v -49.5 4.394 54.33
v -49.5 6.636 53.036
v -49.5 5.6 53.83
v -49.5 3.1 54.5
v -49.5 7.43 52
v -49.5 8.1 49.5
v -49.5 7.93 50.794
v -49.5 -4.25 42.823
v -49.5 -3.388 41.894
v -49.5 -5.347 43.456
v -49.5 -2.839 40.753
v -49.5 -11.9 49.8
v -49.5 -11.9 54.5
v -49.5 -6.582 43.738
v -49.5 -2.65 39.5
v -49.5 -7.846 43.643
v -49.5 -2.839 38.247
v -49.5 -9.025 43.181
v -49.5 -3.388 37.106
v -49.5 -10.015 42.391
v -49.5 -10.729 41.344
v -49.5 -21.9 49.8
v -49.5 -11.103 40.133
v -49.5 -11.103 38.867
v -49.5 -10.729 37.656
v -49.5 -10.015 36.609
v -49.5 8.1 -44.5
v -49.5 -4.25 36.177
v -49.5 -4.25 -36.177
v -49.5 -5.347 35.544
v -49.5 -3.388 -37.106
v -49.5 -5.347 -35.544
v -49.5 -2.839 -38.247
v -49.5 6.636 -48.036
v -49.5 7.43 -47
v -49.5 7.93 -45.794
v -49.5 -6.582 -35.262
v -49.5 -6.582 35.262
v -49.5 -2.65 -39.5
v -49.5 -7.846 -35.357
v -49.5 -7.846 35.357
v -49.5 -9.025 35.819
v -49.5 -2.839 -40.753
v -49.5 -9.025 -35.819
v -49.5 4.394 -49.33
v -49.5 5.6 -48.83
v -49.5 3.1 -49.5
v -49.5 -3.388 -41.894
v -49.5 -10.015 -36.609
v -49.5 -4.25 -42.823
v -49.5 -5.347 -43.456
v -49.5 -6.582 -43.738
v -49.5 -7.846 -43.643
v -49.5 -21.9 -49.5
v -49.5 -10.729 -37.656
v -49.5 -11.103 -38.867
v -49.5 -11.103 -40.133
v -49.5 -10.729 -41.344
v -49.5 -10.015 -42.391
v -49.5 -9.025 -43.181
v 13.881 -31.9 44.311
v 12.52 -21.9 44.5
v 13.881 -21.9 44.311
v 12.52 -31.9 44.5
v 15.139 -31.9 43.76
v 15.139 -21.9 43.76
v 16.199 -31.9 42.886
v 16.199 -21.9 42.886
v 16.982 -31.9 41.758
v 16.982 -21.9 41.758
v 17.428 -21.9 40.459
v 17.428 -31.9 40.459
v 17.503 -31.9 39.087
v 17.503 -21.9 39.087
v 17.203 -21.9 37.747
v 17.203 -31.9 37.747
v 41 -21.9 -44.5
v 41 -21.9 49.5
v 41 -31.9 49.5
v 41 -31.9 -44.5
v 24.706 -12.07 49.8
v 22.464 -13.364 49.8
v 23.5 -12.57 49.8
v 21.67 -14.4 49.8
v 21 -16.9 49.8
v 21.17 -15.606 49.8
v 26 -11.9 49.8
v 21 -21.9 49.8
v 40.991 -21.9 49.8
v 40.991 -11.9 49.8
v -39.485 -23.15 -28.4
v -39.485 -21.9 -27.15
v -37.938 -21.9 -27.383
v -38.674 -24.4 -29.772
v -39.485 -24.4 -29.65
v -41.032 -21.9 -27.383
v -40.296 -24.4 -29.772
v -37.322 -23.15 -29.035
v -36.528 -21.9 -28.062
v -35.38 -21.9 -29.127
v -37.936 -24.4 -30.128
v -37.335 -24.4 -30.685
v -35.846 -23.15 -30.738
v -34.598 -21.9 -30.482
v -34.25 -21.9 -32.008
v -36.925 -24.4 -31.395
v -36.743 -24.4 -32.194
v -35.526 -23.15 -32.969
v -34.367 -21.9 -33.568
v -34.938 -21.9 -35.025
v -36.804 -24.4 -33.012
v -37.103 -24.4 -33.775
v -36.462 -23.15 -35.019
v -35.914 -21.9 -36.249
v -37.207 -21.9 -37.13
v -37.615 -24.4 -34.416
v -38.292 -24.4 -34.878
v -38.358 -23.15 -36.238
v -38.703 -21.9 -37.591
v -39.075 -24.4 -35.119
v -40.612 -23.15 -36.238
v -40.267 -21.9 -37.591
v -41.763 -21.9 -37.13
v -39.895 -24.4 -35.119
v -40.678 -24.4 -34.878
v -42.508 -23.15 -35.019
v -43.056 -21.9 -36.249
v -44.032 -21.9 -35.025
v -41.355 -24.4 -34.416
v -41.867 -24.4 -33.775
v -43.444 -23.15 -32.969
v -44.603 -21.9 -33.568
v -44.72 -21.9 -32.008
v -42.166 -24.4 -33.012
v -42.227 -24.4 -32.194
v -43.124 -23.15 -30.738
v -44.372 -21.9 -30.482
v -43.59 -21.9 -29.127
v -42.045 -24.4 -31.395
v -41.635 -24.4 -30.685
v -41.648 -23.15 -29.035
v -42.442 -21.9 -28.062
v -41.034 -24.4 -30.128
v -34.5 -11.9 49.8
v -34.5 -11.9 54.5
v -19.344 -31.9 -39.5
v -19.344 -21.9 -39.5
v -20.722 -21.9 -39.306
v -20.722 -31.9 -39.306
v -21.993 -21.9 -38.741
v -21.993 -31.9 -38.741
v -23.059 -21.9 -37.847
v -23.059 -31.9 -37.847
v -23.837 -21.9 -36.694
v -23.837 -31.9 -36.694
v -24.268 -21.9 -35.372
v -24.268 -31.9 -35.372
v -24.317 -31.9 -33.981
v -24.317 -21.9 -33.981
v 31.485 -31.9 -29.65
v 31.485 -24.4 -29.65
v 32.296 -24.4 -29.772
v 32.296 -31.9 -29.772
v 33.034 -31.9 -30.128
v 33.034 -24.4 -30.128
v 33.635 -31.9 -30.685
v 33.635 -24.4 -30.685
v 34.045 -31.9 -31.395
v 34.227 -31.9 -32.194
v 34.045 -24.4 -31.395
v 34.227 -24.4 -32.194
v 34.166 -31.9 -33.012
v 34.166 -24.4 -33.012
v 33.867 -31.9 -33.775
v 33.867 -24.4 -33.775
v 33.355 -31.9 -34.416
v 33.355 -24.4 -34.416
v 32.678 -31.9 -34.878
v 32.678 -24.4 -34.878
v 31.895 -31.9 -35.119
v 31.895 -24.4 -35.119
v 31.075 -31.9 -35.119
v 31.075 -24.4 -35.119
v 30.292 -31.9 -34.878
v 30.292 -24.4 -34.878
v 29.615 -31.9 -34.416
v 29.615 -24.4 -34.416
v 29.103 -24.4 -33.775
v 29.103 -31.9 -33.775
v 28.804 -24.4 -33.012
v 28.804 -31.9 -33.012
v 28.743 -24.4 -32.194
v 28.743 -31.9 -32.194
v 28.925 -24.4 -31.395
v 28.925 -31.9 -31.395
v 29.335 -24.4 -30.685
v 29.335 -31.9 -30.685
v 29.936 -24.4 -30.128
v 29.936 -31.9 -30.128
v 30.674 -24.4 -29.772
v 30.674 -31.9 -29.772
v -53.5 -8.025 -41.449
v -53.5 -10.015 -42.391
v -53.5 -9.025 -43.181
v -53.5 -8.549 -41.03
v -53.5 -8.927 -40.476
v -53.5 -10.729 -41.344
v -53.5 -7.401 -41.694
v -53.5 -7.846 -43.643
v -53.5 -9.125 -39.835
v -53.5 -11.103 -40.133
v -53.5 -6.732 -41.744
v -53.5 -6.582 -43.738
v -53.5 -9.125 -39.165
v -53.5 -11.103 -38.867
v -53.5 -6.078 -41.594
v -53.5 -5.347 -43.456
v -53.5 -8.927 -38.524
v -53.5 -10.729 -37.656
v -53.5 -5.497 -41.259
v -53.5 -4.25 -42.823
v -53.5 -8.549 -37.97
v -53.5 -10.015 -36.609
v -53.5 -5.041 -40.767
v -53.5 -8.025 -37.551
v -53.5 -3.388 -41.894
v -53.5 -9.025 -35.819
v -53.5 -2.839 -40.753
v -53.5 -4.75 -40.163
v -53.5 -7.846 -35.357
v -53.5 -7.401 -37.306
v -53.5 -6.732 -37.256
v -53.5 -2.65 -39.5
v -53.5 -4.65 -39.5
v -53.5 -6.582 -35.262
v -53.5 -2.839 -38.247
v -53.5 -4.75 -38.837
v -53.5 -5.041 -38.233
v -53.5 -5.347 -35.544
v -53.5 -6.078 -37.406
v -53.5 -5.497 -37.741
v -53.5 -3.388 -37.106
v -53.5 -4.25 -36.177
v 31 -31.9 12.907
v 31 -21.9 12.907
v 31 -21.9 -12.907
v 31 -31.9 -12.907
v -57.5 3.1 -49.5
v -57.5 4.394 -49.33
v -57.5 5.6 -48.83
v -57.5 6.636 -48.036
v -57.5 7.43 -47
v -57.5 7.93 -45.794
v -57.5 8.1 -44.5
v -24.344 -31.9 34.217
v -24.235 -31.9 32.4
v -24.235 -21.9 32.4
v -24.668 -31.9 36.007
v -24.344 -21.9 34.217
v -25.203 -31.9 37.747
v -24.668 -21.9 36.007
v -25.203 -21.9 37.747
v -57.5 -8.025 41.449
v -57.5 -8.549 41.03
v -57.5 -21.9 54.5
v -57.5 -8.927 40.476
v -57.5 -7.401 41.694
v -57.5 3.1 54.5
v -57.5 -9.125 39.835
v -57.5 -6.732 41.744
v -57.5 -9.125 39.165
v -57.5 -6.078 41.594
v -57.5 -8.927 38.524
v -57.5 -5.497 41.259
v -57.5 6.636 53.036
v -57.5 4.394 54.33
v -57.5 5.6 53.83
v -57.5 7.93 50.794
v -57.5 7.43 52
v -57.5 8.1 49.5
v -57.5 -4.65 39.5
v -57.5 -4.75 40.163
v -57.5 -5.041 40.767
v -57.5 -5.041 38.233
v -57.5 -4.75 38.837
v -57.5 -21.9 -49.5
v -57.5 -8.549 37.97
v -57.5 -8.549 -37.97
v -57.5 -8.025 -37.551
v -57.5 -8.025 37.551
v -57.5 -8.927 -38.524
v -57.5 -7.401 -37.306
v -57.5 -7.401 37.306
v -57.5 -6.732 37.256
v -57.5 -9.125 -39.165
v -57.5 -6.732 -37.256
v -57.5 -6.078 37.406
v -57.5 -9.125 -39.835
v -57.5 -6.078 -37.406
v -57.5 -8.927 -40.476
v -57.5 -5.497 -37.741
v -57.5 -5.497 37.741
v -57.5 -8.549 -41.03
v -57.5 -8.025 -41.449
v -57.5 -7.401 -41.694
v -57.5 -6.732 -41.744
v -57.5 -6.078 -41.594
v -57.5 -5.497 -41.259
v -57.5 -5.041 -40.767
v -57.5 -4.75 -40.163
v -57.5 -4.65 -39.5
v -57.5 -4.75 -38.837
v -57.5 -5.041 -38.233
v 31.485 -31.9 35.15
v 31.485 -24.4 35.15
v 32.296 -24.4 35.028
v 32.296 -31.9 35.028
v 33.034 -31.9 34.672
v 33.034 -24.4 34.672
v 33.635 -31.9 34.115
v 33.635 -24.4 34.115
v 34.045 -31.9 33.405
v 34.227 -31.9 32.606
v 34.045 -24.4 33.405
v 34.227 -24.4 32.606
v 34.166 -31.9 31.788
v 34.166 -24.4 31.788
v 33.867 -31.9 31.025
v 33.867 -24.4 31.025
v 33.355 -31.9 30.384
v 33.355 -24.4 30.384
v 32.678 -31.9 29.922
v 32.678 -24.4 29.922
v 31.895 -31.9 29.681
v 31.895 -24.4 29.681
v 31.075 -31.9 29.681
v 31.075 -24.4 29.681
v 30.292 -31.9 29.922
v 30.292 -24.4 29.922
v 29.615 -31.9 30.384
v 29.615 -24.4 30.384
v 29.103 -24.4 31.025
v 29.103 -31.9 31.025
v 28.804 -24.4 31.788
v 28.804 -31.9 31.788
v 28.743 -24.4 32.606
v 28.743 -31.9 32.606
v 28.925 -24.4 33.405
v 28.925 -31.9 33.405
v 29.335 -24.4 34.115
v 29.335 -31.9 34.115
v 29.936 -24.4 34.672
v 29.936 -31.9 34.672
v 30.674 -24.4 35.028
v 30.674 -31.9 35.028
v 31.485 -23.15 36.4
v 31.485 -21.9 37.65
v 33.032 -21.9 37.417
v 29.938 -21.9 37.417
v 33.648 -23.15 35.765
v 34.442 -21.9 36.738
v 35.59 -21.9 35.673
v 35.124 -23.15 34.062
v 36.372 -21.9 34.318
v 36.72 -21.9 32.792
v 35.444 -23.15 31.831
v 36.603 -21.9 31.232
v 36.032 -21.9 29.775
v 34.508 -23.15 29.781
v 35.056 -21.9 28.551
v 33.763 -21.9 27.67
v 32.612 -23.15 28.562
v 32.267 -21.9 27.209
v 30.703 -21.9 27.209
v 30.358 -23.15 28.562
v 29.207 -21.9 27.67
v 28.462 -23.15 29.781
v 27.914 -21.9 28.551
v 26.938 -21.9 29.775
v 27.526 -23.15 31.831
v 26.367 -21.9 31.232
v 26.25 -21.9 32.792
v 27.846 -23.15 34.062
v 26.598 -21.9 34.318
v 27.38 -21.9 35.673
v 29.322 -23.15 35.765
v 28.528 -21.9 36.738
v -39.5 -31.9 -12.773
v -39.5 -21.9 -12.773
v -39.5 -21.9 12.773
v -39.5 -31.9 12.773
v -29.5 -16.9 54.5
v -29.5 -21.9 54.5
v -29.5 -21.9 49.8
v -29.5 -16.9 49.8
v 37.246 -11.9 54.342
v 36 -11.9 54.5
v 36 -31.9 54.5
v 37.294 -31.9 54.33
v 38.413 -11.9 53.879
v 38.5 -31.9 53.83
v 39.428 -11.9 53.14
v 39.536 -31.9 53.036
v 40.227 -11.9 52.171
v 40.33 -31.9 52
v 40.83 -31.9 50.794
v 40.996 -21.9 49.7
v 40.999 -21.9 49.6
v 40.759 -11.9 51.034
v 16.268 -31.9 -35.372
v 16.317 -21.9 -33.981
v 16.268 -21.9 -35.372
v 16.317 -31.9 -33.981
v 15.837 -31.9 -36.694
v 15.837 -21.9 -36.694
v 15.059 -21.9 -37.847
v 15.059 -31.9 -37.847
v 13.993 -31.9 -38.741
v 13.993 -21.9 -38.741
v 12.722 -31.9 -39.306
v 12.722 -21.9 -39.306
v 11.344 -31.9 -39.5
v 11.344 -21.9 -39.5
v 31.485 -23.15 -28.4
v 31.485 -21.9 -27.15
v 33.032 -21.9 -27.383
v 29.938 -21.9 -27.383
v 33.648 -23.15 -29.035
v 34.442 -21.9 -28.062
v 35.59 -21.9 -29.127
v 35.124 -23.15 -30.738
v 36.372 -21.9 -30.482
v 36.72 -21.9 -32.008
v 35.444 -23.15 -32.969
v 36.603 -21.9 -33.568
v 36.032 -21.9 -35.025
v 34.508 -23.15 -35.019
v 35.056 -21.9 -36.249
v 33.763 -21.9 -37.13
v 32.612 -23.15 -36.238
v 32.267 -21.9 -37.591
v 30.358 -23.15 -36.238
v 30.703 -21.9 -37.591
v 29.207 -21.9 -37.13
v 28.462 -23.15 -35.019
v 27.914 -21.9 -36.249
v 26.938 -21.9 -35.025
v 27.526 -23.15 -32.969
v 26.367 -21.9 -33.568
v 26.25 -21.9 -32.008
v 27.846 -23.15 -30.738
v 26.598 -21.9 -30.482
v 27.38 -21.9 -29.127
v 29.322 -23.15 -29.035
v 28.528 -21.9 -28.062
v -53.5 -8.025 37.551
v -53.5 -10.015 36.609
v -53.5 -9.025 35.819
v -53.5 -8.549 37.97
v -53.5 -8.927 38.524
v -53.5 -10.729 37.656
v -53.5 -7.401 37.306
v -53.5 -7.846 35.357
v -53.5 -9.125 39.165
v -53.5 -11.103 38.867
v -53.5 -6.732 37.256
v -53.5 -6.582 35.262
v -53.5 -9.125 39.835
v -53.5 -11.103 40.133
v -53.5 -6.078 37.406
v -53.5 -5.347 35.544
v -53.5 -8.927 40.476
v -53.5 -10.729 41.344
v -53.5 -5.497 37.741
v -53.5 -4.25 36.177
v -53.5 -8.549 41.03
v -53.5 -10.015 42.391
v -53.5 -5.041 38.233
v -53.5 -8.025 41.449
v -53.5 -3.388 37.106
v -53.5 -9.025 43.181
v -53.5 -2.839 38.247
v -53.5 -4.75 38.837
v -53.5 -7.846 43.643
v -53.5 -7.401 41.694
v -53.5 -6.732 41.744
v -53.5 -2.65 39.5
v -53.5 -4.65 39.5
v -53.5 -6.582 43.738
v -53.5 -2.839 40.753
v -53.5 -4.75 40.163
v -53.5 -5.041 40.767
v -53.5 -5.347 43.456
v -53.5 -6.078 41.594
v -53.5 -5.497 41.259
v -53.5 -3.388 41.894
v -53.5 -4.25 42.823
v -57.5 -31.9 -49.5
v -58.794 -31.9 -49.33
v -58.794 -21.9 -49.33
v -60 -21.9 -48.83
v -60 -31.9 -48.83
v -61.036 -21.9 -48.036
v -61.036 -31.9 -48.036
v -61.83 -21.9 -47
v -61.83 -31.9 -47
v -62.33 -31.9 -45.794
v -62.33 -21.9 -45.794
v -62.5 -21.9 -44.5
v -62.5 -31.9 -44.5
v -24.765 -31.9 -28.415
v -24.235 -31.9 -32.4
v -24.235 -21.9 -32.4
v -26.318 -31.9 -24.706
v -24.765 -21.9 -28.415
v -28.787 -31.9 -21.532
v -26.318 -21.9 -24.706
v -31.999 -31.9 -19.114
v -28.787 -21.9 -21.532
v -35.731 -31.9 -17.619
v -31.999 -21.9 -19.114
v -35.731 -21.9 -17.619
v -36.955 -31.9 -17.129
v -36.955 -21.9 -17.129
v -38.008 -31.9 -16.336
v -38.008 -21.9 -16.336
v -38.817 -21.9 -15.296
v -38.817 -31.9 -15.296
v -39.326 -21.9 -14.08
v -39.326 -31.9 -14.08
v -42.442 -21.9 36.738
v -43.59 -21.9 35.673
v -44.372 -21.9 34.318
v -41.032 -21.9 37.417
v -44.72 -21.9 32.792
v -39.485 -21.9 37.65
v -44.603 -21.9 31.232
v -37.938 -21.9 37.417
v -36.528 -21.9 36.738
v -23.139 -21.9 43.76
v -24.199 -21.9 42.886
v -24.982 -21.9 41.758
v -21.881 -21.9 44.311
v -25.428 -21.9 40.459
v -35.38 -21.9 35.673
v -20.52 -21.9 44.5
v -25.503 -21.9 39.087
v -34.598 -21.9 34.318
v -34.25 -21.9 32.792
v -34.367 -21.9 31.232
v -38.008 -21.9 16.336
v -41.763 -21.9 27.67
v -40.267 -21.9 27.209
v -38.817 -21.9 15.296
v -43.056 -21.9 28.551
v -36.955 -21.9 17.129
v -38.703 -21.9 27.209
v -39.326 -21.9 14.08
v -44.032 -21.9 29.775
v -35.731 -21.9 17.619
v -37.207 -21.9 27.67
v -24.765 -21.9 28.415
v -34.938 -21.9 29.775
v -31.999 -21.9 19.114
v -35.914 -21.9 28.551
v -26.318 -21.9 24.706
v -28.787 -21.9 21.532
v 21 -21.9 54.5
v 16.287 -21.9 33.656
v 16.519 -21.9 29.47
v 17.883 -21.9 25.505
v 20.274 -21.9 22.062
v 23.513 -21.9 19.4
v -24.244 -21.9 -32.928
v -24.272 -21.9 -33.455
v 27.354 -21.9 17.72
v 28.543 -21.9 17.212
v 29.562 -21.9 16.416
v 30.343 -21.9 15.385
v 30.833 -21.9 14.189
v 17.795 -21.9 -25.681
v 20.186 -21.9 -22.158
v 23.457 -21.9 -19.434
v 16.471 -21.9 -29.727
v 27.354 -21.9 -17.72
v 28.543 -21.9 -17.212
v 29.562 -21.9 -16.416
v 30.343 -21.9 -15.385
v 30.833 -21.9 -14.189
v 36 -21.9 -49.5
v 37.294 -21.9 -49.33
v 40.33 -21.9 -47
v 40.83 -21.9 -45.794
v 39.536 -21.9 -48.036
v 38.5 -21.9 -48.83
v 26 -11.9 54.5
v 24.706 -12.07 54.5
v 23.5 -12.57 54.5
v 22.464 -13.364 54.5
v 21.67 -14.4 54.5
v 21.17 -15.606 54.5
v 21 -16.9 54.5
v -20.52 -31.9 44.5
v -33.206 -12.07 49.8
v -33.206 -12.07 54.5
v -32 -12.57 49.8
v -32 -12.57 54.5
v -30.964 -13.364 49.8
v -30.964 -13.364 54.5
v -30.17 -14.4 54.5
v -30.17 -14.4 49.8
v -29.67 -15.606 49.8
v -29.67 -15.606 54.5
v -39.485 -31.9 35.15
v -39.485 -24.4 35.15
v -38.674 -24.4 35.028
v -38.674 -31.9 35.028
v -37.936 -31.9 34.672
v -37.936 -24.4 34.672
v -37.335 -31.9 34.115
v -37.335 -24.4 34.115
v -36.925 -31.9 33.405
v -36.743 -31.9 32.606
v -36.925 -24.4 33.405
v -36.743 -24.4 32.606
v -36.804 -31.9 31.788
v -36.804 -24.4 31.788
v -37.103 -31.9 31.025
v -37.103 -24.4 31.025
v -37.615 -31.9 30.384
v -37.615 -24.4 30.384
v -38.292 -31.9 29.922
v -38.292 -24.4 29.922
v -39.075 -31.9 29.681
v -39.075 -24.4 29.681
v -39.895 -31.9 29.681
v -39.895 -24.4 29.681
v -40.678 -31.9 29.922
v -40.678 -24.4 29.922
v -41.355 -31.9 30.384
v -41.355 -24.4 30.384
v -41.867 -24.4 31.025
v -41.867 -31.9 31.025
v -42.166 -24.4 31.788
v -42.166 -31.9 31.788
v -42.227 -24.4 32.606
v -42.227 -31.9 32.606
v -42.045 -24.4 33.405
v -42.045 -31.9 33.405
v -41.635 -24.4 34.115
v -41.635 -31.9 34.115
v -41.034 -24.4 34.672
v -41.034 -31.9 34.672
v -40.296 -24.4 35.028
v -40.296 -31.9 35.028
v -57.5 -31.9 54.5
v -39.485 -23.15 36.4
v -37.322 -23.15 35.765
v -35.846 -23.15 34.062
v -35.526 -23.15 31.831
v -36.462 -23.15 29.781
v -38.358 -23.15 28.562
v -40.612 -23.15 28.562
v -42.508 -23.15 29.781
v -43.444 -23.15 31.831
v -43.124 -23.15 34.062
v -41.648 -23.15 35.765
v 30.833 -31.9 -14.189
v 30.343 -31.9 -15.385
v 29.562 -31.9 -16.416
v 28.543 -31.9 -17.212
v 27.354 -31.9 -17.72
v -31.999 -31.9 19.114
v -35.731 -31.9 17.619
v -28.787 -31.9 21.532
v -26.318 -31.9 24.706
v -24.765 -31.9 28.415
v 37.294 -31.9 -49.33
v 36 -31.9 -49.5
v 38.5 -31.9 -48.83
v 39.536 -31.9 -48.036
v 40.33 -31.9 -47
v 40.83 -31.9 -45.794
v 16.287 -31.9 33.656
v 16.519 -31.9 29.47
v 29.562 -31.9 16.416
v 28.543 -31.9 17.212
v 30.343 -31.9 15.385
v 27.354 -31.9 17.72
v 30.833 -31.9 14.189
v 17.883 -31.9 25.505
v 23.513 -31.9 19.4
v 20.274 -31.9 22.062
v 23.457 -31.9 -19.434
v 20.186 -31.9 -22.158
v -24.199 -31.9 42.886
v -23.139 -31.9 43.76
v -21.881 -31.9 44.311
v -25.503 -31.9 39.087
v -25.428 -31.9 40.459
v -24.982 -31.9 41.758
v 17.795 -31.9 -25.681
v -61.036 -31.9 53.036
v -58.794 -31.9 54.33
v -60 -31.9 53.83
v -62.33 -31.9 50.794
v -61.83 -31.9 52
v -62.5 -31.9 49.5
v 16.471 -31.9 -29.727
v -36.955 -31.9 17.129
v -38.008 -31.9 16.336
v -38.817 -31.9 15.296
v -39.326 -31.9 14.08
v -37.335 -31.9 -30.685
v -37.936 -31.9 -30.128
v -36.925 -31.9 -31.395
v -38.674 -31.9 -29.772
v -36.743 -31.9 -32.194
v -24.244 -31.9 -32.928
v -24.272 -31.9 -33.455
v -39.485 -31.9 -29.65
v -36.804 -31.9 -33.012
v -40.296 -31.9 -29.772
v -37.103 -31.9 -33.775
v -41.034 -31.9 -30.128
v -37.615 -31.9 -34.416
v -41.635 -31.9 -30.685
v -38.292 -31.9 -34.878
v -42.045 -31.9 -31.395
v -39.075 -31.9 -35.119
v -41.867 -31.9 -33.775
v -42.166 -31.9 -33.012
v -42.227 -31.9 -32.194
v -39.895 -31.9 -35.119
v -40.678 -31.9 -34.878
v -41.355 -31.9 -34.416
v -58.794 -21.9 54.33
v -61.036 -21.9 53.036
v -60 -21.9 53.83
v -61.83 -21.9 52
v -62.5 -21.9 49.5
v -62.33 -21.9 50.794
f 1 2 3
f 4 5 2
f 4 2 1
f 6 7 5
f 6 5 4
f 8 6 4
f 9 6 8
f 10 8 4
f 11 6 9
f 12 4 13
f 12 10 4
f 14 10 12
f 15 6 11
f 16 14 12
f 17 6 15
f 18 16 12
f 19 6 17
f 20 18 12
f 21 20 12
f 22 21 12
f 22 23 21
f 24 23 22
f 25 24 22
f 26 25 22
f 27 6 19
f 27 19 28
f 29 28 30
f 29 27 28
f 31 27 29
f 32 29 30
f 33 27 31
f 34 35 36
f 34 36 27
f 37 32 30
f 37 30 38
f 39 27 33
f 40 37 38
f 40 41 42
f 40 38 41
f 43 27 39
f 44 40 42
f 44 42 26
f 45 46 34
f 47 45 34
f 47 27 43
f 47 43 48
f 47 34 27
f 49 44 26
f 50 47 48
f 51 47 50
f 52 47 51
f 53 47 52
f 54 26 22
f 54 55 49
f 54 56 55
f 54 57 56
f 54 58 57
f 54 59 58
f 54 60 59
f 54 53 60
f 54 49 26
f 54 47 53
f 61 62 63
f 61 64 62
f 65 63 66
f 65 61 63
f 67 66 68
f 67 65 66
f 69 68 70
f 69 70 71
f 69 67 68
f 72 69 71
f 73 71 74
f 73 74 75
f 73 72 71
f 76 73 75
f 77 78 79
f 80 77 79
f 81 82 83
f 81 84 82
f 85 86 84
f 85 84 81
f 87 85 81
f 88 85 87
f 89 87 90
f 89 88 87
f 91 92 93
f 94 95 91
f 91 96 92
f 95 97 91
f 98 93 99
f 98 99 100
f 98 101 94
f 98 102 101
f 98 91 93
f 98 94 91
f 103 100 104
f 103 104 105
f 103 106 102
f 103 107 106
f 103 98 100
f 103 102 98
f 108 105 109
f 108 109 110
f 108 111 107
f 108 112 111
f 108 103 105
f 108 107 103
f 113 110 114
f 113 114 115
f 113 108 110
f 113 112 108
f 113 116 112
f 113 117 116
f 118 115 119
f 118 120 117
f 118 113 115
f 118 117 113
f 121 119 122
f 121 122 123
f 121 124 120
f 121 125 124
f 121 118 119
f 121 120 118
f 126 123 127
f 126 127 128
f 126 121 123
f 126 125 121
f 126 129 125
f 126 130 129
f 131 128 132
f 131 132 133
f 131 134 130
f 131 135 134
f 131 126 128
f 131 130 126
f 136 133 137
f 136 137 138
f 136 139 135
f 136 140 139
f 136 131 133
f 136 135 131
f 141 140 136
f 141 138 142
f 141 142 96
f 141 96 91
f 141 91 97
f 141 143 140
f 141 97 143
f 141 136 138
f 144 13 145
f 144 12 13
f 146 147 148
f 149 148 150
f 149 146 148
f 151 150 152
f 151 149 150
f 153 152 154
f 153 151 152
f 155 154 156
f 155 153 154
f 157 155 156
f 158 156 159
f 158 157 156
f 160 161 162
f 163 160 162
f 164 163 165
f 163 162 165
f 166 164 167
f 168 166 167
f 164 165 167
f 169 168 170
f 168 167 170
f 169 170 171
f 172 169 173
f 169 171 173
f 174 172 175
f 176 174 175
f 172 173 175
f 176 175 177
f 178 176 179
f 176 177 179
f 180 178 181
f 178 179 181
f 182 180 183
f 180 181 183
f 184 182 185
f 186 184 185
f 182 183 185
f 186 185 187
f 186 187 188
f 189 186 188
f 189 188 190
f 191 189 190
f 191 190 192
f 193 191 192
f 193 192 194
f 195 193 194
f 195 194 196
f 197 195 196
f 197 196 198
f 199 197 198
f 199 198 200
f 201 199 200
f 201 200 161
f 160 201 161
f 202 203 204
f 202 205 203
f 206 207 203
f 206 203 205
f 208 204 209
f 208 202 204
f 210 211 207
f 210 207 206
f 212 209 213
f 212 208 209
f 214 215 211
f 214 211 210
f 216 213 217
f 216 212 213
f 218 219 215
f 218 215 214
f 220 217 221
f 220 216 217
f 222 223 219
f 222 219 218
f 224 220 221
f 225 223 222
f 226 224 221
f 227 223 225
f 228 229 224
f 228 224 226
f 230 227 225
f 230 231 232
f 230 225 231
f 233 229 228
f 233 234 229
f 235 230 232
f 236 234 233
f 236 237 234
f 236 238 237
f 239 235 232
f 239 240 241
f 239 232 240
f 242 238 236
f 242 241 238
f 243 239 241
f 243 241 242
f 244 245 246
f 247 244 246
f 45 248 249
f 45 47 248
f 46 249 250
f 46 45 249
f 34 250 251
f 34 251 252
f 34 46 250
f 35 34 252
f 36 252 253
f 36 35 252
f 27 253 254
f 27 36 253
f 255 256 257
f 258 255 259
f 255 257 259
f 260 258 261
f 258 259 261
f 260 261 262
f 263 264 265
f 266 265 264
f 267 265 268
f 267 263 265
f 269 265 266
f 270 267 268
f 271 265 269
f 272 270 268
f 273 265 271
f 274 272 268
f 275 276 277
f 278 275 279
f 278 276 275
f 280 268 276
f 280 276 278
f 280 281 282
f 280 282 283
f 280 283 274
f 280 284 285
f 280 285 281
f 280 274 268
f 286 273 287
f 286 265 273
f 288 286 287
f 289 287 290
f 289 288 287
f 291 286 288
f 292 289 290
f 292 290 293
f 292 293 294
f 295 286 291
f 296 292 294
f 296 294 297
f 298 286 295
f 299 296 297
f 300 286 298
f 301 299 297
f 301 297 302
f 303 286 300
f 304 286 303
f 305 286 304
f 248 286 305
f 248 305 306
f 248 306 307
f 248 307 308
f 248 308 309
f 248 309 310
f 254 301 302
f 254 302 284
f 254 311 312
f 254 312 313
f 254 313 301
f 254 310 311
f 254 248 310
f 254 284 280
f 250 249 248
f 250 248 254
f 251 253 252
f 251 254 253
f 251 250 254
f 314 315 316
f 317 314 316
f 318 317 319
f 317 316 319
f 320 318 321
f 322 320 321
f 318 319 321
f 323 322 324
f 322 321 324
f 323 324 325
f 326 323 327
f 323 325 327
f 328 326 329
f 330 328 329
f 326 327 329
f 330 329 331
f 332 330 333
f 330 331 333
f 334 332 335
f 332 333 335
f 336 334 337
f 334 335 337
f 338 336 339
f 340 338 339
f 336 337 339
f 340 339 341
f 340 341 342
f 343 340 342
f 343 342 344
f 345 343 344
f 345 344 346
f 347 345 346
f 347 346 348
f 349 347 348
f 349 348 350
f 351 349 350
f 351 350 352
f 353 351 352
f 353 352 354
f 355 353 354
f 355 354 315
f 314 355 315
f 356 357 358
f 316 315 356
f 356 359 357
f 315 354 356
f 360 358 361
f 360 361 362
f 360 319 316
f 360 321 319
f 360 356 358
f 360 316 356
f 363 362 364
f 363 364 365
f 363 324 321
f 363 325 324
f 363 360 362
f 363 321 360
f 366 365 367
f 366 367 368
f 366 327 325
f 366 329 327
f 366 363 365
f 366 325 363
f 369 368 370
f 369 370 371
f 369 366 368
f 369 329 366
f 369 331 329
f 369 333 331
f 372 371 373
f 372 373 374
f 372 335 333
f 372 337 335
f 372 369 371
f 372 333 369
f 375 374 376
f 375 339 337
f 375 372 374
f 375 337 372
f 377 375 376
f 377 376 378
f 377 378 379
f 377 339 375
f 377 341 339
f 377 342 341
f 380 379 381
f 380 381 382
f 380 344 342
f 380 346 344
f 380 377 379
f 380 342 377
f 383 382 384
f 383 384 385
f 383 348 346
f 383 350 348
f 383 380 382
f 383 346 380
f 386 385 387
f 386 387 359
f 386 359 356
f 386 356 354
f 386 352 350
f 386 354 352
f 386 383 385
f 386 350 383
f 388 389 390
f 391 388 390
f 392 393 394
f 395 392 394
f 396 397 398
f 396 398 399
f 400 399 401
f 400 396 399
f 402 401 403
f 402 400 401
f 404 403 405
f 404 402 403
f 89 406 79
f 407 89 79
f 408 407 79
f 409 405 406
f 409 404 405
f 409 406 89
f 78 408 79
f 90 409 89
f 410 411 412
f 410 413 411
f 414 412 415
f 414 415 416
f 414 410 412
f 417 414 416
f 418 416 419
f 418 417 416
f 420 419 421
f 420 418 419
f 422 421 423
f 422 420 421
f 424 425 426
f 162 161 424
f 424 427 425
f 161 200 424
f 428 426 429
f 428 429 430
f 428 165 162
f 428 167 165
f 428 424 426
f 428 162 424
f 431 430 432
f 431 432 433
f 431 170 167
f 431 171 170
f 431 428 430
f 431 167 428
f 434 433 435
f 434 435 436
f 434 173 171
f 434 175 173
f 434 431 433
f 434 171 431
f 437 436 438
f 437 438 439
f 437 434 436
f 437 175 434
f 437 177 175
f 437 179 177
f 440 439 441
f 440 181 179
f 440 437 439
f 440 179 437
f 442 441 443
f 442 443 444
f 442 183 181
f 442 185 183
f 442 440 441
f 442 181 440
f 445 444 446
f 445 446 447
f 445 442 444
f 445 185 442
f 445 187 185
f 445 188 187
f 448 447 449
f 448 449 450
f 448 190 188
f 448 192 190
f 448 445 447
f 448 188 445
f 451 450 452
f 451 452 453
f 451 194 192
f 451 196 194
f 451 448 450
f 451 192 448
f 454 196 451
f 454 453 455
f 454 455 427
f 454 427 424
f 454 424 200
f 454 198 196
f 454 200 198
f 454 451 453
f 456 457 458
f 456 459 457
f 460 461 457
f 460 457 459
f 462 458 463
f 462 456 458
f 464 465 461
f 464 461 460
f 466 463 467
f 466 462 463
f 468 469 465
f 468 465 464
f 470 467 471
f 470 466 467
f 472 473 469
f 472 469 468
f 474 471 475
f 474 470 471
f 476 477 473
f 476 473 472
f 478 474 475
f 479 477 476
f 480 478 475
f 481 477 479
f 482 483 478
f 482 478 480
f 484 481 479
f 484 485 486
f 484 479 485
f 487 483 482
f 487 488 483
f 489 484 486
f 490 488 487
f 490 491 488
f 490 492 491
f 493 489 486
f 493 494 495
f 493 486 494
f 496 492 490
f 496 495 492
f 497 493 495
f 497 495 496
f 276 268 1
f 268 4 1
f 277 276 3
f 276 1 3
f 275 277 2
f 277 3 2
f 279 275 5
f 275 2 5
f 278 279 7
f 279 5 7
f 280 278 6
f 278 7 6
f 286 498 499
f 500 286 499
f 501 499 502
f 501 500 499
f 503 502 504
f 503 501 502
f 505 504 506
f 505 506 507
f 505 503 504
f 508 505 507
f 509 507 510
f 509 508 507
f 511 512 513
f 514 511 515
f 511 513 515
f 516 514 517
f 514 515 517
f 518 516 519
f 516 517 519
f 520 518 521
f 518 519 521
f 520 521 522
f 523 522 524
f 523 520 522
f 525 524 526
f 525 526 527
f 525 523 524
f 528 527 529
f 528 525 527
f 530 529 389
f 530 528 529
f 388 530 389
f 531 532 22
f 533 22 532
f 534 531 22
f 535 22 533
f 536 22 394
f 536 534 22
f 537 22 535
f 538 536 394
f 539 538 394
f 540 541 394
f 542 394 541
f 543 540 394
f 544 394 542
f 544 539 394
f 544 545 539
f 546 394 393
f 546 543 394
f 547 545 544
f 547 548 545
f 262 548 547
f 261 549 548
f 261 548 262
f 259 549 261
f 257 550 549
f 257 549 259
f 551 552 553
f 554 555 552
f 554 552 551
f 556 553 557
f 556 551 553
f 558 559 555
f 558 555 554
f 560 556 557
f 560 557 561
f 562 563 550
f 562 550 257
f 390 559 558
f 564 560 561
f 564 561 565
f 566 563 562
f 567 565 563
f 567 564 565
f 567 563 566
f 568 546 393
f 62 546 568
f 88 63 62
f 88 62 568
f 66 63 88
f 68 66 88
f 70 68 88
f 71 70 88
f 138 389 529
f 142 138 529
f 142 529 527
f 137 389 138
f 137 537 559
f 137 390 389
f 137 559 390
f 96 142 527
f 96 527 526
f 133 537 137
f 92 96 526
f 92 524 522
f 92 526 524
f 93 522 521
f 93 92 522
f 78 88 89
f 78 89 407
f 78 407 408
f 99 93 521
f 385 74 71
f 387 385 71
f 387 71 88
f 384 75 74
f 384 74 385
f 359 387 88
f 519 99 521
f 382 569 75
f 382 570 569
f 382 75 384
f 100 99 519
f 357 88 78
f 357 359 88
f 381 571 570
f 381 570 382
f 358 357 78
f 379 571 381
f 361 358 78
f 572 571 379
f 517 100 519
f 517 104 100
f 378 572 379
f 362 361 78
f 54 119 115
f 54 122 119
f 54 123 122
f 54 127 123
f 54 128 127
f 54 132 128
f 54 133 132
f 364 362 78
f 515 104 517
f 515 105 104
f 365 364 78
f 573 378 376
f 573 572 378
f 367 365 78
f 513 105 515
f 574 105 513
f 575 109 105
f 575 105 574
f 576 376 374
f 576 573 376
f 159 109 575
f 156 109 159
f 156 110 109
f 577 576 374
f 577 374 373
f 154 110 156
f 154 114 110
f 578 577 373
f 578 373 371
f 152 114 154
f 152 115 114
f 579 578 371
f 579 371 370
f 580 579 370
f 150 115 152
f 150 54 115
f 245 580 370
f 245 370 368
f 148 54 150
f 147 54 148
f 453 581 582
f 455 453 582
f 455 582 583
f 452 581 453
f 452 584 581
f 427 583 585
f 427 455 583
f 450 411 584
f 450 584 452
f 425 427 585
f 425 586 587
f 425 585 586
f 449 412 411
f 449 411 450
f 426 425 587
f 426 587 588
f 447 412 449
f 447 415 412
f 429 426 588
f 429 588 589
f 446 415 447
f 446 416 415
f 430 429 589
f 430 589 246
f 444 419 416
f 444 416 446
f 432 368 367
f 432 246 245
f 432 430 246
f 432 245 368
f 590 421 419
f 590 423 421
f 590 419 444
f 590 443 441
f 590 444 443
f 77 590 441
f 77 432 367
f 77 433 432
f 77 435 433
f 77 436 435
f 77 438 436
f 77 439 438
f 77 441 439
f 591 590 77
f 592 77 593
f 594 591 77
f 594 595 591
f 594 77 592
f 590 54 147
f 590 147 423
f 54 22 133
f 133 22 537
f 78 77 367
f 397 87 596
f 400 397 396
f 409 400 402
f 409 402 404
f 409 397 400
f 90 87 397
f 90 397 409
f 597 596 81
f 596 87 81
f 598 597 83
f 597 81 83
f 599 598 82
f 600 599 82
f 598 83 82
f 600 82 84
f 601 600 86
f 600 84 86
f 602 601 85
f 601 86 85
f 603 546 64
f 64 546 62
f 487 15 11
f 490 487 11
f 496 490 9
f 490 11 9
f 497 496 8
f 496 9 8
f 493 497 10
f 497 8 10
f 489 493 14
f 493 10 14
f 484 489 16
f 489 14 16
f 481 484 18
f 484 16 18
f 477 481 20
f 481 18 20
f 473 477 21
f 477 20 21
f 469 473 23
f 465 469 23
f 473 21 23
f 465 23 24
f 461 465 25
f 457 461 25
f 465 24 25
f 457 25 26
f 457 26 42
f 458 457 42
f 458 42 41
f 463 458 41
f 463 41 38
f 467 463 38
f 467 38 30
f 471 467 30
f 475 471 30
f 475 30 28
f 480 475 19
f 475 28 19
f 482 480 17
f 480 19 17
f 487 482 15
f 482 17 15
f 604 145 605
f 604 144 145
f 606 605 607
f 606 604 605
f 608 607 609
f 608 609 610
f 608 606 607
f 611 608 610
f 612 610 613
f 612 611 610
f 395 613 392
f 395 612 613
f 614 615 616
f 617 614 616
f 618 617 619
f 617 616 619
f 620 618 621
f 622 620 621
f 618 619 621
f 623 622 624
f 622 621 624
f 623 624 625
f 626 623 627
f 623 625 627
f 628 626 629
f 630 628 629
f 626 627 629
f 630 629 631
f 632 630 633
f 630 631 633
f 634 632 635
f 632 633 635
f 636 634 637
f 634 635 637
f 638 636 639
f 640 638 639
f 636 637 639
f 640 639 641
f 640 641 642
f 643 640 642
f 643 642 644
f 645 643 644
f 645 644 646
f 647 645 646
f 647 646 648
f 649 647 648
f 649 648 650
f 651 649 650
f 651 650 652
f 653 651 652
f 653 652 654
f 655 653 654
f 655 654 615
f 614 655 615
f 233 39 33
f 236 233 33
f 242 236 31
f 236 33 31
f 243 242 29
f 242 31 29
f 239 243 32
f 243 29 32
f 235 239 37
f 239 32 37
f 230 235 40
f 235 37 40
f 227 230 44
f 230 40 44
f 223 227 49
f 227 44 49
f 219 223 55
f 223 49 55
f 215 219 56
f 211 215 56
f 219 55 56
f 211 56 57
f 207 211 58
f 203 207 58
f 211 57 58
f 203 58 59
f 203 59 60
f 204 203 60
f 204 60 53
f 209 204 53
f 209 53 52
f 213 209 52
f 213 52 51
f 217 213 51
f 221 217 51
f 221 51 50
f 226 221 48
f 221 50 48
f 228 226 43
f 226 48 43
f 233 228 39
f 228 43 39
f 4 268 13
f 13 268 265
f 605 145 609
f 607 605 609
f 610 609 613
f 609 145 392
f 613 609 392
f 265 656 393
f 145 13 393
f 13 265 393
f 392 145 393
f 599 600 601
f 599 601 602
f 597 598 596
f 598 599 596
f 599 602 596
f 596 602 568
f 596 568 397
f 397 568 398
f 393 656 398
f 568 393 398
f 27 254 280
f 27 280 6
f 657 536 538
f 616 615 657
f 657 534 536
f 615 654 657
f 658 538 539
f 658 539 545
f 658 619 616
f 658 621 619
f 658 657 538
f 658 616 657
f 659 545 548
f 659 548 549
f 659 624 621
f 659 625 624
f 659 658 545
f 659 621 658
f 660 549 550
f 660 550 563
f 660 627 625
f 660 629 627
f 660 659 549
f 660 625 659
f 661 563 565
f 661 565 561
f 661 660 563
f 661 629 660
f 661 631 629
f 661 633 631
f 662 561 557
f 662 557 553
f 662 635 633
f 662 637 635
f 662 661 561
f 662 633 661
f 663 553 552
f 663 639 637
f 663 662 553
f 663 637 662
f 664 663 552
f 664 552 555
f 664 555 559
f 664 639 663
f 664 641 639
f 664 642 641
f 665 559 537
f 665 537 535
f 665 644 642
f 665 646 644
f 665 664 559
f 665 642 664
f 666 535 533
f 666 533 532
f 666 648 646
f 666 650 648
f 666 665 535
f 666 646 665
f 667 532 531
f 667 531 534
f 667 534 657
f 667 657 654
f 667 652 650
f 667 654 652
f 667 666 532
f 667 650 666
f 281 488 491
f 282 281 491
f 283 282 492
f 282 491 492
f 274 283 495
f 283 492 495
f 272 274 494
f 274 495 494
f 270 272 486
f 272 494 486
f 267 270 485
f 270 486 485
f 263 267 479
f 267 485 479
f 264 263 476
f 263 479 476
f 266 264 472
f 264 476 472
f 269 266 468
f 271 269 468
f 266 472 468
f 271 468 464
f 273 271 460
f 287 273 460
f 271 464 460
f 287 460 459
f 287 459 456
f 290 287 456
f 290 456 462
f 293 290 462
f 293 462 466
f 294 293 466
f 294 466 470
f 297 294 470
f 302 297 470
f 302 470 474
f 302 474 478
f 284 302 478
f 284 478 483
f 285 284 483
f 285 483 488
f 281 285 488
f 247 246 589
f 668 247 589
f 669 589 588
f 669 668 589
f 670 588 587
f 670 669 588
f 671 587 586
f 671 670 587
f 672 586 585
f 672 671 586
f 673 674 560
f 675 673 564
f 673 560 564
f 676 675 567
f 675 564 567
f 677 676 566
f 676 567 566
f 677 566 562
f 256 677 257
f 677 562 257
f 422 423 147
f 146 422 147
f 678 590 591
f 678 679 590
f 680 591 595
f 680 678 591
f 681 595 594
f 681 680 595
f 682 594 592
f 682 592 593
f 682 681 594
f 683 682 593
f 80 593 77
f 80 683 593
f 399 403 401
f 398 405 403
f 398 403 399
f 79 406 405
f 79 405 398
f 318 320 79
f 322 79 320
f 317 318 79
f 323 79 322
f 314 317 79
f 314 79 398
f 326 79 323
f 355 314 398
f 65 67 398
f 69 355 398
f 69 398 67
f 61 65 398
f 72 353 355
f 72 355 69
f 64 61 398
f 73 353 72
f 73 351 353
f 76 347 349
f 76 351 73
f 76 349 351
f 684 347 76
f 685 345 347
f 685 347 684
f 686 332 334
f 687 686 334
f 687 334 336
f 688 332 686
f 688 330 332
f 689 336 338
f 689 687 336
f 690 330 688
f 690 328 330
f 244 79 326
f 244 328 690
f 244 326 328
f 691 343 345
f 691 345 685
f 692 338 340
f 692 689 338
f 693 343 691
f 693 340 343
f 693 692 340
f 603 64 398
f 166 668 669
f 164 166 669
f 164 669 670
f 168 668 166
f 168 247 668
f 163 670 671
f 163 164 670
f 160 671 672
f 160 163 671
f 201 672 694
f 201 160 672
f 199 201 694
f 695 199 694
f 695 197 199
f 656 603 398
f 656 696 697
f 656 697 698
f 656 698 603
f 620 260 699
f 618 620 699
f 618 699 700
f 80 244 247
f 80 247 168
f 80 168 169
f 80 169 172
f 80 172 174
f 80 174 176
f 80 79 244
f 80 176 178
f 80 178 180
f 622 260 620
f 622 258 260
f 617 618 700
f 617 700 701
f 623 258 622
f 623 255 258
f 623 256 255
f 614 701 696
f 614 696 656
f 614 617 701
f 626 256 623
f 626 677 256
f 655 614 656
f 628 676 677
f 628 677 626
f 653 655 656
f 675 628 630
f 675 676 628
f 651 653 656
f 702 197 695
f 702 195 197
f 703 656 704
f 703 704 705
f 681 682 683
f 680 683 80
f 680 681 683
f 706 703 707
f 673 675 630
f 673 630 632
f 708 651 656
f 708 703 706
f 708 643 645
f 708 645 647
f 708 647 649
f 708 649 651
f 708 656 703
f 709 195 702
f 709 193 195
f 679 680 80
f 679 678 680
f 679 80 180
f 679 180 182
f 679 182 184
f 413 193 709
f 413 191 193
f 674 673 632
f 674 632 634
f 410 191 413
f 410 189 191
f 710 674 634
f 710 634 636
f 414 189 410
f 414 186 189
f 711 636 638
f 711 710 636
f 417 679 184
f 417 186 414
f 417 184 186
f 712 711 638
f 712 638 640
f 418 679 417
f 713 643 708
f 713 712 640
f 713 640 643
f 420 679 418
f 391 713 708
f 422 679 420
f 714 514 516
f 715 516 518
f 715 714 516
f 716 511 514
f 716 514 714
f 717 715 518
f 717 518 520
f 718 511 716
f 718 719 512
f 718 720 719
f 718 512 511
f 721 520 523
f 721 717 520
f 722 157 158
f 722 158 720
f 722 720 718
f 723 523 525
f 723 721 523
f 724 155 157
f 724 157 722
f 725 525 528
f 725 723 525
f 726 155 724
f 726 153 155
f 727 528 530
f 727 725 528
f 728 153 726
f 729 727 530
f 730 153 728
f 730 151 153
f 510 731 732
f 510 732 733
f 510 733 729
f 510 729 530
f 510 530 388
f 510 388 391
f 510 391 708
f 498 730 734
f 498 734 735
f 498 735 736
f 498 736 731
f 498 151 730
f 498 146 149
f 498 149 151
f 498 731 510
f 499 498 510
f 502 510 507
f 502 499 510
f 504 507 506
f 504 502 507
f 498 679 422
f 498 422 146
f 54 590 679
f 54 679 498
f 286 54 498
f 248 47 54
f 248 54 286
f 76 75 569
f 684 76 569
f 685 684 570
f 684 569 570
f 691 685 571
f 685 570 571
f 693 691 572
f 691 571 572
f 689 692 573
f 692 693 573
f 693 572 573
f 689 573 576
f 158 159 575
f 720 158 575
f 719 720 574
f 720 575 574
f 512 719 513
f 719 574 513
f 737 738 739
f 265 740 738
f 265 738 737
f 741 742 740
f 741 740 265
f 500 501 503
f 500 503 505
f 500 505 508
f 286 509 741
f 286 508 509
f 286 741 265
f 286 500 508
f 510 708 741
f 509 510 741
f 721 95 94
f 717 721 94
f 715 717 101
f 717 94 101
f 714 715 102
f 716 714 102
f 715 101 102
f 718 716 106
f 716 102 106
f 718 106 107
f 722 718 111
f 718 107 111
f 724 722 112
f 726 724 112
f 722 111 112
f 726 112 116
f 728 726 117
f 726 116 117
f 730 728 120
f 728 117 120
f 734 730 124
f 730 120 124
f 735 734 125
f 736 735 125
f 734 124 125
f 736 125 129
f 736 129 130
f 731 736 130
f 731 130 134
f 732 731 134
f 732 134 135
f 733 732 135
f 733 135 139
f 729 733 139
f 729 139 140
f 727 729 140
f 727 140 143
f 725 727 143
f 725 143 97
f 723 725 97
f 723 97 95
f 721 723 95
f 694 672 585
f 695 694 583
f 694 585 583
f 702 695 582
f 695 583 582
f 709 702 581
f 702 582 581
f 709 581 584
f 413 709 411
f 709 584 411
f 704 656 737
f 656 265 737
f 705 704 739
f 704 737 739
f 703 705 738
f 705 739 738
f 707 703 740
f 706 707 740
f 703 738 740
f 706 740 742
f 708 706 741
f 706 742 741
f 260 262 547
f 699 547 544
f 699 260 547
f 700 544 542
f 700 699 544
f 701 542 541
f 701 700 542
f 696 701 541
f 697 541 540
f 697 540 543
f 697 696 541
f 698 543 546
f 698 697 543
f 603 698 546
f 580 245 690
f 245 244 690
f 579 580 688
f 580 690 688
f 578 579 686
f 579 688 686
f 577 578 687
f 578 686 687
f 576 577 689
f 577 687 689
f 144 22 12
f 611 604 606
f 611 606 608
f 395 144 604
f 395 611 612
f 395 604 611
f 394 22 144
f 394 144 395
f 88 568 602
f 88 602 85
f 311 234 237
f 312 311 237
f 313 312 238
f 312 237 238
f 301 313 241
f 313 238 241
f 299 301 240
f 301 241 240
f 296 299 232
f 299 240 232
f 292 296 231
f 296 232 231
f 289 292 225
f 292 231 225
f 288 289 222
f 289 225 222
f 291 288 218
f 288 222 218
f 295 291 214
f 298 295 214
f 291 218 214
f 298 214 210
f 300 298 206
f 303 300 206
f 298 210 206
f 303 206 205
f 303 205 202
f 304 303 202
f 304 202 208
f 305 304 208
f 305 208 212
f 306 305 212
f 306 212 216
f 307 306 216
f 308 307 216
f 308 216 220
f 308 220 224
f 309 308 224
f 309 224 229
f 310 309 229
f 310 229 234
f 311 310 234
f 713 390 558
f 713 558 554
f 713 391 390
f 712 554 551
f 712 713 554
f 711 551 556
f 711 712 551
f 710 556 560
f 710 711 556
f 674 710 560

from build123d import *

# Parameters (mm, degrees)
EXTRUDE_1_DEPTH      = 54.5
EXTRUDE_1_DEPTH_BACK = 49.5
SKETCH_4_R           = 2.25
CUT_EXTRUDE_1_DEPTH  = 111.354474309
SKETCH_5_R           = 4.25
CUT_EXTRUDE_2_DEPTH  = 4
SKETCH_6_R           = 2.75
CUT_EXTRUDE_3_DEPTH  = 89.184465752
CHAMFER_1_SIZE       = 2.5
CUT_EXTRUDE_4_DEPTH  = 89.184465752
SKETCH_10_W          = 20
SKETCH_10_H          = 4.7
EXTRUDE_2_DEPTH      = 10
FILLET_1_R           = 5


with BuildPart() as part:
    # ｽｹｯﾁ3 → ﾎﾞｽ - 押し出し1 (new, two sides: drawn at the far end of the back side and taken through both)
    with BuildSketch(Plane.XY.offset(-EXTRUDE_1_DEPTH_BACK)):
        Polygon((-57.5, 8.1), (-49.5, 8.1), (-49.5, -21.9), (41, -21.9), (41, -31.9), (-62.5, -31.9), (-62.5, -21.9), (-57.5, -21.9), align=None)
    extrude(amount=EXTRUDE_1_DEPTH + EXTRUDE_1_DEPTH_BACK)

    # ｽｹｯﾁ4 → ｶｯﾄ - 押し出し1 (cut, through all)
    with BuildSketch(Plane(origin=(-49.5, 0, 0), x_dir=(0, 0, -1), z_dir=(1, 0, 0))):
        with Locations(Location((-39.5, -6.9, 0), (0, 0, 90))):
            Circle(SKETCH_4_R)
        with Locations(Location((39.5, -6.9, 0), (0, 0, 90))):
            Circle(SKETCH_4_R)
    extrude(amount=-CUT_EXTRUDE_1_DEPTH, mode=Mode.SUBTRACT)

    # ｽｹｯﾁ5 → ｶｯﾄ - 押し出し2 (cut)
    with BuildSketch(Plane(origin=(-49.5, 0, 0), x_dir=(0, 0, -1), z_dir=(1, 0, 0))):
        with Locations(Location((-39.5, -6.9, 0), (0, 0, 90))):
            Circle(SKETCH_5_R)
        with Locations(Location((39.5, -6.9, 0), (0, 0, 90))):
            Circle(SKETCH_5_R)
    extrude(amount=-CUT_EXTRUDE_2_DEPTH, mode=Mode.SUBTRACT)

    # ｽｹｯﾁ6 → ｶｯﾄ - 押し出し3 (cut, through all)
    with BuildSketch(Plane(origin=(0, -21.9, 0), x_dir=(1, 0, 0), z_dir=(0, 1, 0))):
        with Locations(Location((-39.485, 32.4, 0), (0, 0, 270))):
            Circle(SKETCH_6_R)
        with Locations(Location((31.485, 32.4, 0), (0, 0, 270))):
            Circle(SKETCH_6_R)
        with Locations(Location((31.485, -32.4, 0), (0, 0, 270))):
            Circle(SKETCH_6_R)
        with Locations(Location((-39.485, -32.4, 0), (0, 0, 270))):
            Circle(SKETCH_6_R)
    extrude(amount=-CUT_EXTRUDE_3_DEPTH, mode=Mode.SUBTRACT)

    # 面取り1
    chamfer_1_edges = [part.edges().sort_by_distance(p)[0] for p in [
        (-39.485, -21.9, -35.15),
        (31.485, -21.9, -35.15),
        (31.485, -21.9, 29.65),
        (-39.485, -21.9, 29.65),
    ]]
    chamfer(chamfer_1_edges, length=CHAMFER_1_SIZE)

    # ｽｹｯﾁ7 → ｶｯﾄ - 押し出し4 (cut, through all)
    with BuildSketch(Plane(origin=(0, -21.9, 0), x_dir=(1, 0, 0), z_dir=(0, 1, 0))):
        with BuildLine():
            ThreePointArc((22.203162897, -44.5), (16.96784035, -27.729392364), (31, -17.157714246))
            Line((31, -17.157714246), (31, 17.157714246))
            ThreePointArc((31, 17.157714246), (18.30682719, 24.725479729), (17.988611594, 39.5))
            Line((17.988611594, 39.5), (-25.988611594, 39.5))
            ThreePointArc((-25.988611594, 39.5), (-24.679892382, 36.056677236), (-24.235, 32.4))
            ThreePointArc((-24.235, 32.4), (-28.706926192, 21.611319589), (-39.5, 17.150007377))
            Line((-39.5, 17.150007377), (-39.5, -17.150007377))
            ThreePointArc((-39.5, -17.150007377), (-28.706926192, -21.611319589), (-24.235, -32.4))
            ThreePointArc((-24.235, -32.4), (-25.808185389, -39.14590558), (-30.203162897, -44.5))
            Line((-30.203162897, -44.5), (22.203162897, -44.5))
        make_face()
    extrude(amount=-CUT_EXTRUDE_4_DEPTH, mode=Mode.SUBTRACT)

    # ｽｹｯﾁ10 → ﾎﾞｽ - 押し出し2 (add)
    with BuildSketch(Plane(origin=(0, -21.9, 0), x_dir=(1, 0, 0), z_dir=(0, 1, 0))):
        with Locations((-39.5, -52.15)):
            Rectangle(SKETCH_10_W, SKETCH_10_H)
        with Locations((31, -52.15)):
            Rectangle(SKETCH_10_W, SKETCH_10_H)
    extrude(amount=EXTRUDE_2_DEPTH)

    # ﾌｨﾚｯﾄ1
    fillet_1_edges = [part.edges().sort_by_distance(p)[0] for p in [
        (-62.5, -26.9, -49.5),
        (31, -26.9, 17.157714246),
        (22.203162897, -26.9, 44.5),
        (-30.203162897, -26.9, 44.5),
        (-39.5, -26.9, 17.150007377),
        (-39.5, -26.9, -17.150007377),
        (-25.988611594, -26.9, -39.5),
        (17.988611594, -26.9, -39.5),
        (31, -26.9, -17.157714246),
        (-29.5, -11.9, 52.15),
        (21, -11.9, 52.15),
        (41, -26.9, -49.5),
        (-62.5, -26.9, 54.5),
        (41, -21.9, 54.5),
        (-53.5, 8.1, 54.5),
        (-53.5, 8.1, -49.5),
    ]]
    fillet(fillet_1_edges, radius=FILLET_1_R)


solid = part.part
